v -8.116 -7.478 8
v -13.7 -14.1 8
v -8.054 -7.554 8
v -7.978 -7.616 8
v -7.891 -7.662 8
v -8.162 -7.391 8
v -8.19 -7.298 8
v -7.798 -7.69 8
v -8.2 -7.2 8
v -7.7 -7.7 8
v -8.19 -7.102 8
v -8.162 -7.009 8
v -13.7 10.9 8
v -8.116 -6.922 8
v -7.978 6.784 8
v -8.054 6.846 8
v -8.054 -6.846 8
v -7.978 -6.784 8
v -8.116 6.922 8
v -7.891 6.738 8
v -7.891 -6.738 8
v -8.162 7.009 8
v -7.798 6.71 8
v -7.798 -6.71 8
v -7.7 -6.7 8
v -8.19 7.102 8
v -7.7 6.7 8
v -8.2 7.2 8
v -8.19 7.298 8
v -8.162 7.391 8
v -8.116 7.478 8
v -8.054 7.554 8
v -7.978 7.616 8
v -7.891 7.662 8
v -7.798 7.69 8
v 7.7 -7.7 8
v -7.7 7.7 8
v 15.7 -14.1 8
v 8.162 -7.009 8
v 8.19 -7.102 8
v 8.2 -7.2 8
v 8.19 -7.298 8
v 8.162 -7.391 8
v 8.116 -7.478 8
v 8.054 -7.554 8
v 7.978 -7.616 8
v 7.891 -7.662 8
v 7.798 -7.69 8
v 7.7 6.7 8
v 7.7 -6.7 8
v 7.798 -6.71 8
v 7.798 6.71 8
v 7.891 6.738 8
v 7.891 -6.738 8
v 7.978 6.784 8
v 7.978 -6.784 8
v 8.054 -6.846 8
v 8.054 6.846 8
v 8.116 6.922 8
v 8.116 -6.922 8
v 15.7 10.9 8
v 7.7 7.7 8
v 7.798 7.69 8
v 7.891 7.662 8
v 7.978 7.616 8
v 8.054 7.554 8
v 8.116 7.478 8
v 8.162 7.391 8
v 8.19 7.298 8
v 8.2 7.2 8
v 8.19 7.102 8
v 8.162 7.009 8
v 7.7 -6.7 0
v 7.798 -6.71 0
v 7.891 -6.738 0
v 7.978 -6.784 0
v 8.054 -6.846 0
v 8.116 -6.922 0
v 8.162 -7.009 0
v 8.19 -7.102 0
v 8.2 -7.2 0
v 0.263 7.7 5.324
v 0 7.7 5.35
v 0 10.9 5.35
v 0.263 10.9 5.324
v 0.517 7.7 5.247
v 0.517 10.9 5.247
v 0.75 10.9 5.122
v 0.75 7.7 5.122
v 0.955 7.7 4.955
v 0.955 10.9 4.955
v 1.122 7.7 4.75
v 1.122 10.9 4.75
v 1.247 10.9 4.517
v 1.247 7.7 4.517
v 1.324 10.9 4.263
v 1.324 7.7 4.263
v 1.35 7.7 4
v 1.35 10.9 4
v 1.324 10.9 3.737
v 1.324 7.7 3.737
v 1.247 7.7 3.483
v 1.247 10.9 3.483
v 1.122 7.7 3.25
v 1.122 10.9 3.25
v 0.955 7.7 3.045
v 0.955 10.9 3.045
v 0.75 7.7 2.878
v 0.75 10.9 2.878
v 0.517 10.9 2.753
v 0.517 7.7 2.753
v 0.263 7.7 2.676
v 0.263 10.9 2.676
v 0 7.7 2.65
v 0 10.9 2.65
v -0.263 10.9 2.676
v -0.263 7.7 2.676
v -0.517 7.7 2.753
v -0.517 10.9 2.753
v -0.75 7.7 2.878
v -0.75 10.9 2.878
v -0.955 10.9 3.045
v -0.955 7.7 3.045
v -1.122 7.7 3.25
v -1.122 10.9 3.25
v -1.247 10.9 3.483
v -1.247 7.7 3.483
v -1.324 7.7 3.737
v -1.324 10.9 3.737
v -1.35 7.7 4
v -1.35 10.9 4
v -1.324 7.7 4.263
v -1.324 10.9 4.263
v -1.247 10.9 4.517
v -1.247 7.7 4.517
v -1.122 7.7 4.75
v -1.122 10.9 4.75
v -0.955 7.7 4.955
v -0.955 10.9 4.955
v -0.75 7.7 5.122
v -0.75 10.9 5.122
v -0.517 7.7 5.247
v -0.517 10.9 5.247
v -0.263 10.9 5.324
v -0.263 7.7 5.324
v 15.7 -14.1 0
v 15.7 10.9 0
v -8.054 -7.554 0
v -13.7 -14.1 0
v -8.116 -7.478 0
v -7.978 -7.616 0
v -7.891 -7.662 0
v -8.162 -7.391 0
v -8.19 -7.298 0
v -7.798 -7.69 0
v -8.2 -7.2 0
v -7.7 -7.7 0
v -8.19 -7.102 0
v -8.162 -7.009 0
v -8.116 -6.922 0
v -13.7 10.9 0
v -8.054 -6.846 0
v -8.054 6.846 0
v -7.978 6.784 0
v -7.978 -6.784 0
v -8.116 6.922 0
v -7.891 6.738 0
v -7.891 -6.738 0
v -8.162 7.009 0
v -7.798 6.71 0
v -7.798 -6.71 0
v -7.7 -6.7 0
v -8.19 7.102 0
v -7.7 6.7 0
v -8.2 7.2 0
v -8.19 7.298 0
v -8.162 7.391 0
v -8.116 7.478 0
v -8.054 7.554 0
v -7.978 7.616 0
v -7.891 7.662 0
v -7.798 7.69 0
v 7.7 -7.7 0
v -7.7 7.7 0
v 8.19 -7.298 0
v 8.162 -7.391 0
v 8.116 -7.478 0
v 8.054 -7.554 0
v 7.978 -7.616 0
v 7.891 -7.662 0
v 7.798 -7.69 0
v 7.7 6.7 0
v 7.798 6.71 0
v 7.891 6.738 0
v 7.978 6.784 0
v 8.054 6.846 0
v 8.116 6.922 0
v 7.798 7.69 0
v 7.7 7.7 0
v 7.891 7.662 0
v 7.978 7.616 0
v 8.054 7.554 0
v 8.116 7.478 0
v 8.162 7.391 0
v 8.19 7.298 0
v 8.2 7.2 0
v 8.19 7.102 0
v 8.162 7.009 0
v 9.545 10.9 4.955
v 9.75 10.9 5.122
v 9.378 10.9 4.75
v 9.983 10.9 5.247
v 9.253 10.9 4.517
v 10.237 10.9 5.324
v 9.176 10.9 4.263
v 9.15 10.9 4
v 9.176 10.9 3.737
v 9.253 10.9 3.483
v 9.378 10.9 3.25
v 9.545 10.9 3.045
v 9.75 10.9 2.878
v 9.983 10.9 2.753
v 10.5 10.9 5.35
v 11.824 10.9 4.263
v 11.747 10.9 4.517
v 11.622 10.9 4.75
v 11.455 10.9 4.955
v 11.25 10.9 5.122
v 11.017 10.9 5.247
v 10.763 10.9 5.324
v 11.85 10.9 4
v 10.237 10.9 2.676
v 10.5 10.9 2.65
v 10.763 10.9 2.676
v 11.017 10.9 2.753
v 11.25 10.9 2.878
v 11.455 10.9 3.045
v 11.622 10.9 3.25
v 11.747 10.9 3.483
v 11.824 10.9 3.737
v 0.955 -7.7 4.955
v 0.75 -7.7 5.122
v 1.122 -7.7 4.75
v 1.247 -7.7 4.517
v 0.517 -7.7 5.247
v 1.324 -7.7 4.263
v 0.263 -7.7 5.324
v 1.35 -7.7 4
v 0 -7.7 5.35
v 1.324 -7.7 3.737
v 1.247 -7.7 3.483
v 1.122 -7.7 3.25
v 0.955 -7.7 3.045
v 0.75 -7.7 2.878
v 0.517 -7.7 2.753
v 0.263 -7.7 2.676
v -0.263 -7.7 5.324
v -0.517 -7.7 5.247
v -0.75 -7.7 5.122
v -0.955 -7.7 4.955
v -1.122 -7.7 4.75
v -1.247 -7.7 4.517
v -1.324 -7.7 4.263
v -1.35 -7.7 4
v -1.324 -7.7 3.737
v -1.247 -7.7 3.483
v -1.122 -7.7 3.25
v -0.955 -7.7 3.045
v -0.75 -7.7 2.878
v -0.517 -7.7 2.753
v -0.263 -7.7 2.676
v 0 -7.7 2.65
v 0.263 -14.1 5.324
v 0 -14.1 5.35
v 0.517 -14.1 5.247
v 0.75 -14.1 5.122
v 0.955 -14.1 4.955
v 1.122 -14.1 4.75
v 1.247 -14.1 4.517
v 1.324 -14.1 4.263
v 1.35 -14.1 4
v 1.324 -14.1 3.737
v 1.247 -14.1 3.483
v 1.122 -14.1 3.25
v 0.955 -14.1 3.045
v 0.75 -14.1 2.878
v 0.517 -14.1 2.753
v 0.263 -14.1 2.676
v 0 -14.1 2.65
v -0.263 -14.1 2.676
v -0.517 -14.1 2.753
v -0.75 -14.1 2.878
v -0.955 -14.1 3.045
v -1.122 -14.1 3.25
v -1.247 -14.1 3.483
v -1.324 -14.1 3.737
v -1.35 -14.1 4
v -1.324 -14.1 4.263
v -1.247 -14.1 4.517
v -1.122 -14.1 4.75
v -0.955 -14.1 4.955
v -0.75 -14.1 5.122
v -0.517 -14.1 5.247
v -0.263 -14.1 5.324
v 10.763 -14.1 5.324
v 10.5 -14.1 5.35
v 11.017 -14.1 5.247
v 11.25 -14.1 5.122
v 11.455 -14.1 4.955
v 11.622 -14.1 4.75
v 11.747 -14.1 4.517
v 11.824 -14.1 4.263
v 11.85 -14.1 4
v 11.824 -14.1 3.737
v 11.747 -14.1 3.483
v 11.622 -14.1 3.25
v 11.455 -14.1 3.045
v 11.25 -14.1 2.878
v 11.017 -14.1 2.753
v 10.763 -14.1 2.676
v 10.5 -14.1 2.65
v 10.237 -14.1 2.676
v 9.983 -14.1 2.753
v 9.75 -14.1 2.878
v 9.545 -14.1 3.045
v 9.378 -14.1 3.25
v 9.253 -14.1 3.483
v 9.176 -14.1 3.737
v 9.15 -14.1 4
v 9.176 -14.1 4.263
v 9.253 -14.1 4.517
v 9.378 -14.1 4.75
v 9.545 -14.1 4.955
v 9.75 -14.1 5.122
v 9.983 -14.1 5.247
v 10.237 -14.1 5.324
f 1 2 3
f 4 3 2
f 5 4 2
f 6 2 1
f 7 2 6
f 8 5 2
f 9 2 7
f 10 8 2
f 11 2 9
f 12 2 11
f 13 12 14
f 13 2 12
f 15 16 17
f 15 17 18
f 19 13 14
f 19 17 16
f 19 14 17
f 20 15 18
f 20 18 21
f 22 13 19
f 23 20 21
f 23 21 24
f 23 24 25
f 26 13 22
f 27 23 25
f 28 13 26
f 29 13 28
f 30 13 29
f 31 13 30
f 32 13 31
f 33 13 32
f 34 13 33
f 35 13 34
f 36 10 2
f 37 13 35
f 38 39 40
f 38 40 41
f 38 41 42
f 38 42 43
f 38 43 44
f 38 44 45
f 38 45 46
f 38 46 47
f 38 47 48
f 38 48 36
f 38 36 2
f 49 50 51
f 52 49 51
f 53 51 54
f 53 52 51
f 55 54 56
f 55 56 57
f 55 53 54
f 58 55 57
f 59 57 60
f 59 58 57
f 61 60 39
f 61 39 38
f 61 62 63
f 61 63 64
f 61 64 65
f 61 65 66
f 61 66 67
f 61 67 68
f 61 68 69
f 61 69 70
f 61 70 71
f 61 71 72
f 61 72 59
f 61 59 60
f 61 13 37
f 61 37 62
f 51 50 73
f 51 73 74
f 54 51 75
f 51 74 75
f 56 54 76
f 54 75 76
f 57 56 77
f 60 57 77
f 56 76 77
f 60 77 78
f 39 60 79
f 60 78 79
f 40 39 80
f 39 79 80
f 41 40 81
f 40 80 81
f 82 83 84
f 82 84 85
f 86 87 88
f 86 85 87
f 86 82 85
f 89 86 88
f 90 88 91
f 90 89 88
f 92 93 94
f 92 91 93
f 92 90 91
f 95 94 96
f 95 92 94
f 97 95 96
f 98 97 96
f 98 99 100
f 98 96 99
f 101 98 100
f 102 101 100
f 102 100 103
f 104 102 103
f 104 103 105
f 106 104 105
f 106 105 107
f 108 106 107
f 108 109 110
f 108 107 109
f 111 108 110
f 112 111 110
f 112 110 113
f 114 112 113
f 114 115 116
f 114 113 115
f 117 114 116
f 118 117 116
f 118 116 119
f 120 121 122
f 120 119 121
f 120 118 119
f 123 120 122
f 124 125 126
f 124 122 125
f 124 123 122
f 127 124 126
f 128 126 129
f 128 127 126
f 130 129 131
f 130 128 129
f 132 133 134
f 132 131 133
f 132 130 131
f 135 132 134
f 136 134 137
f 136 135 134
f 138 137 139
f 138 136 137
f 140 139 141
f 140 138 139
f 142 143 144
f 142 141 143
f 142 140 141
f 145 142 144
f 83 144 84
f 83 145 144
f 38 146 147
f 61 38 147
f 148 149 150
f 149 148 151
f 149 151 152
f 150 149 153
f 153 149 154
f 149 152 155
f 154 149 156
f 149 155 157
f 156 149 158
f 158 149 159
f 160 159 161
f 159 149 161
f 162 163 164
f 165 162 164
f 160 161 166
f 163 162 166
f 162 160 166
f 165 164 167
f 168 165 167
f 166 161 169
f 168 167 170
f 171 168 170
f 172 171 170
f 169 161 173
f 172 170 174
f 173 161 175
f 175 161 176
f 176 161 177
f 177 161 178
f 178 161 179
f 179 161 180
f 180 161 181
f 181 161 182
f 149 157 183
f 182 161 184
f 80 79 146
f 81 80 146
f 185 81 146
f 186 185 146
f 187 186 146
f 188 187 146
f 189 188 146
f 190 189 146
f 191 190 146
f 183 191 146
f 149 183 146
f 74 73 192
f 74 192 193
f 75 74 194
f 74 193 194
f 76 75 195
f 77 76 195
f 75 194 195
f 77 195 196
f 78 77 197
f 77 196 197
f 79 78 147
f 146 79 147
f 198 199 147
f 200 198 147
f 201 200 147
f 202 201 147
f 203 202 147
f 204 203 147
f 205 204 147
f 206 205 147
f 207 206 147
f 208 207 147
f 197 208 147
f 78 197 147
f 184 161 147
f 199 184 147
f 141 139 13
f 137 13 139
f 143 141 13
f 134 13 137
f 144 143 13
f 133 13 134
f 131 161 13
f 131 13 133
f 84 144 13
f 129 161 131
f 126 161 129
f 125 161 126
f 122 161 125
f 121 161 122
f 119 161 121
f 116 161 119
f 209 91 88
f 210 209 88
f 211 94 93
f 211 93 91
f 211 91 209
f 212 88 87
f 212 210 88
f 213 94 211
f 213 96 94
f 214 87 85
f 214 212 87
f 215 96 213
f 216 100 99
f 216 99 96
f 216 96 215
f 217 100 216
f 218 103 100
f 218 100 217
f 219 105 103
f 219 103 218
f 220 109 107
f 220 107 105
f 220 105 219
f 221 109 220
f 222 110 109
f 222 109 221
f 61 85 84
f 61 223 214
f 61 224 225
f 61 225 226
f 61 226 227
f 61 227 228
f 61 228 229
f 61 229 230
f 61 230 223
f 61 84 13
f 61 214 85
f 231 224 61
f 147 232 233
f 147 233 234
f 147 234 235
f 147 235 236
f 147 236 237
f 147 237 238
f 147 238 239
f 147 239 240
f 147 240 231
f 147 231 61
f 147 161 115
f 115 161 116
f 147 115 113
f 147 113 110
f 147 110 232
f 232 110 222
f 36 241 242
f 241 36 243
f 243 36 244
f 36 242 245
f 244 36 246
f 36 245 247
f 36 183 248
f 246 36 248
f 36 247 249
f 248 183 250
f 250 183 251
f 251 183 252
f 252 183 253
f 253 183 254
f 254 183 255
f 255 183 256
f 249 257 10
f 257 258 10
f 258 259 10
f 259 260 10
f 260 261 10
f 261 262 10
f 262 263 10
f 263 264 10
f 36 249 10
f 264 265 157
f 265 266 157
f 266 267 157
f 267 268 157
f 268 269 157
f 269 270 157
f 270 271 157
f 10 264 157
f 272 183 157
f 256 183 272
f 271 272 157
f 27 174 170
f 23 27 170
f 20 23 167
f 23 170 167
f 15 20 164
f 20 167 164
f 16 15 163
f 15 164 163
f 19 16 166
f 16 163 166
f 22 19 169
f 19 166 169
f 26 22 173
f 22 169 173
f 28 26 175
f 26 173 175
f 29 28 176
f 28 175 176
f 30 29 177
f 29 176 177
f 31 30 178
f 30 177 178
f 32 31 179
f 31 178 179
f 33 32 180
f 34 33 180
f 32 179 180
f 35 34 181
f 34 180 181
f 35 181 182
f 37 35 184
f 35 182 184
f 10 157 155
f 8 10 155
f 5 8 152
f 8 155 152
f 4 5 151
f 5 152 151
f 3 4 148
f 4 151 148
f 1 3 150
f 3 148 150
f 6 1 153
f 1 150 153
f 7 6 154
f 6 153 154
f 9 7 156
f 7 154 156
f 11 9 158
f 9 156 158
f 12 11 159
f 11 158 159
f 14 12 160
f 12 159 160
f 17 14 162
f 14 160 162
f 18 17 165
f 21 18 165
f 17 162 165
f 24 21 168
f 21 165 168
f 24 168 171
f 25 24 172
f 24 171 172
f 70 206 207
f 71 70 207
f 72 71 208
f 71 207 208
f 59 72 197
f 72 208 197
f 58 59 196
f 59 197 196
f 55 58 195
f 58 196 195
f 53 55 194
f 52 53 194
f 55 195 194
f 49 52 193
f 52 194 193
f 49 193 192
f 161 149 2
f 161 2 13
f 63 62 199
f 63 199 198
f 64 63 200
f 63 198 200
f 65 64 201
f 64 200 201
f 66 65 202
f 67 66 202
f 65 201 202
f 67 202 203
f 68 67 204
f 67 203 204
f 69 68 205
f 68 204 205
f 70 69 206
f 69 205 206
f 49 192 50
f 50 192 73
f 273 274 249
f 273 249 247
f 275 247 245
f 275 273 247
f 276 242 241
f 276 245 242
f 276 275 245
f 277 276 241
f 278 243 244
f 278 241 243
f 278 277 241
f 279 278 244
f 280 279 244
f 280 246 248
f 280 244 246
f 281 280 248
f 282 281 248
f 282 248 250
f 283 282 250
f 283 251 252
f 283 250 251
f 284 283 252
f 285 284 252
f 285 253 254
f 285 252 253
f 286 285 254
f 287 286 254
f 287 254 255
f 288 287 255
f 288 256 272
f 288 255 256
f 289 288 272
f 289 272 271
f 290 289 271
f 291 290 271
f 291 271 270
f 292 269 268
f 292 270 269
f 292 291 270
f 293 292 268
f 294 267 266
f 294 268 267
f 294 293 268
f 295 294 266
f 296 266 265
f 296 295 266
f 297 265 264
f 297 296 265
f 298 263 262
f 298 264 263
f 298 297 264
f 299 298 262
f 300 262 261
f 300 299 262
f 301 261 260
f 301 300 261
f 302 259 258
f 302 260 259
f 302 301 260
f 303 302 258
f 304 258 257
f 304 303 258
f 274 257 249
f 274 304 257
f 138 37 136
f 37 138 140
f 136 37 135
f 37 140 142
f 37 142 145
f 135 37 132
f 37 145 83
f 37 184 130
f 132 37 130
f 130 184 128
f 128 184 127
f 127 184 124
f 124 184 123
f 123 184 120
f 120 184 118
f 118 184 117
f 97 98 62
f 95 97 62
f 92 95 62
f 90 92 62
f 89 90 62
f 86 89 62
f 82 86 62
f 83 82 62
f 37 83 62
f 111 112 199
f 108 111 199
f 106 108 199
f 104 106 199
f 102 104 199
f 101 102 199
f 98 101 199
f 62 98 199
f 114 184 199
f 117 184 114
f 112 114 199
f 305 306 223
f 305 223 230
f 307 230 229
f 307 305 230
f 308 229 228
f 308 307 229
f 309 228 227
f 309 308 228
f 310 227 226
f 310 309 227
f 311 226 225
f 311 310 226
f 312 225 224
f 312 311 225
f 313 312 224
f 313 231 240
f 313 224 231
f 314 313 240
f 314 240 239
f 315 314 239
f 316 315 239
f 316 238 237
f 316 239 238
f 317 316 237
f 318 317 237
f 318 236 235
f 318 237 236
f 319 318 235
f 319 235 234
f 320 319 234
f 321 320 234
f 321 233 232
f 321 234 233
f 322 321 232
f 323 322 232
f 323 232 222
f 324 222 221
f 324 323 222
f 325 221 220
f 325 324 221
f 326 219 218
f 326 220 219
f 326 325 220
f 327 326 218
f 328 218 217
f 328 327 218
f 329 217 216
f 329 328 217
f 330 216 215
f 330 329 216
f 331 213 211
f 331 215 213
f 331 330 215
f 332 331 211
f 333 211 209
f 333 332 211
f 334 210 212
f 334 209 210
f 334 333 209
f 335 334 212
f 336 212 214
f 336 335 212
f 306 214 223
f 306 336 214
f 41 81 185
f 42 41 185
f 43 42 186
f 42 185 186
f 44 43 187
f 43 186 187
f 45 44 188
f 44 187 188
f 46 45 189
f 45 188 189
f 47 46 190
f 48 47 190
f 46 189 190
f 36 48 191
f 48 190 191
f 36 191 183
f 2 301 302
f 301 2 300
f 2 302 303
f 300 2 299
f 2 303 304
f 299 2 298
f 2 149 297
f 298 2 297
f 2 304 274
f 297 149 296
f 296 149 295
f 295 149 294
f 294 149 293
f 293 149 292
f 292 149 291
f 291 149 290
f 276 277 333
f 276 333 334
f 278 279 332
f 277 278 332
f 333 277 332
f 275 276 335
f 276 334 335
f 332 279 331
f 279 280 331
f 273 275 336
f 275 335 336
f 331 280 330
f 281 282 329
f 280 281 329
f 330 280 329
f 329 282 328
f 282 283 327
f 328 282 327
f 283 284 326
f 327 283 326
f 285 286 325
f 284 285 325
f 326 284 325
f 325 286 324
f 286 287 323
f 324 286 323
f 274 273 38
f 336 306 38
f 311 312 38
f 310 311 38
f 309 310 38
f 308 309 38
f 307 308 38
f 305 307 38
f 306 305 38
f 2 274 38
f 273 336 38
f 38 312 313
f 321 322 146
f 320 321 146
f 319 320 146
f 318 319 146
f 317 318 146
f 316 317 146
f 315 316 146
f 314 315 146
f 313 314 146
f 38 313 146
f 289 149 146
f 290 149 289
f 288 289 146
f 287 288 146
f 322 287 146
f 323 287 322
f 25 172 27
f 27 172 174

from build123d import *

# Parameters (mm, degrees)
SKETCH_2_W               = 29.4
SKETCH_2_H               = 25
EXTRUDE_1_DEPTH          = 8
CUT_EXTRUDE_1_DEPTH      = 31.58578101
CUT_EXTRUDE_1_DEPTH_BACK = 31.58578101
SKETCH_3_R               = 1.35


with BuildPart() as part:
    # 草图2 → 凸台-拉伸1 (new body)
    with BuildSketch(Plane.XY):
        with Locations((1, -1.6)):
            Rectangle(SKETCH_2_W, SKETCH_2_H)
        with BuildLine():
            ThreePointArc((8.2, -7.2), (8.053553391, -7.553553391), (7.7, -7.7))
            Line((7.7, -7.7), (-7.7, -7.7))
            ThreePointArc((-7.7, -7.7), (-8.2, -7.2), (-7.7, -6.7))
            Line((-7.7, -6.7), (-7.7, 6.7))
            ThreePointArc((-7.7, 6.7), (-8.2, 7.2), (-7.7, 7.7))
            Line((-7.7, 7.7), (7.7, 7.7))
            ThreePointArc((7.7, 7.7), (8.053553391, 7.553553391), (8.2, 7.2))
            ThreePointArc((8.2, 7.2), (8.053553391, 6.846446609), (7.7, 6.7))
            Line((7.7, 6.7), (7.7, -6.7))
            ThreePointArc((7.7, -6.7), (8.053553391, -6.846446609), (8.2, -7.2))
        make_face(mode=Mode.SUBTRACT)
    extrude(amount=EXTRUDE_1_DEPTH)

    # 草图3 → 切除-拉伸1 (cut, two sides: drawn at the far end of the back side and taken through both)
    with BuildSketch(Plane(origin=(0, 10.9, 0), x_dir=(1, 0, 0), z_dir=(0, 1, 0)).offset(-CUT_EXTRUDE_1_DEPTH_BACK)):
        with Locations(Location((10.5, -4, 0), (0, 0, 270))):
            Circle(SKETCH_3_R)
        with Locations((21, -4)):
            Circle(SKETCH_3_R)
        with Locations(Location((0, -4, 0), (0, 0, 270))):
            Circle(SKETCH_3_R)
    extrude(amount=CUT_EXTRUDE_1_DEPTH + CUT_EXTRUDE_1_DEPTH_BACK, mode=Mode.SUBTRACT)


solid = part.part
